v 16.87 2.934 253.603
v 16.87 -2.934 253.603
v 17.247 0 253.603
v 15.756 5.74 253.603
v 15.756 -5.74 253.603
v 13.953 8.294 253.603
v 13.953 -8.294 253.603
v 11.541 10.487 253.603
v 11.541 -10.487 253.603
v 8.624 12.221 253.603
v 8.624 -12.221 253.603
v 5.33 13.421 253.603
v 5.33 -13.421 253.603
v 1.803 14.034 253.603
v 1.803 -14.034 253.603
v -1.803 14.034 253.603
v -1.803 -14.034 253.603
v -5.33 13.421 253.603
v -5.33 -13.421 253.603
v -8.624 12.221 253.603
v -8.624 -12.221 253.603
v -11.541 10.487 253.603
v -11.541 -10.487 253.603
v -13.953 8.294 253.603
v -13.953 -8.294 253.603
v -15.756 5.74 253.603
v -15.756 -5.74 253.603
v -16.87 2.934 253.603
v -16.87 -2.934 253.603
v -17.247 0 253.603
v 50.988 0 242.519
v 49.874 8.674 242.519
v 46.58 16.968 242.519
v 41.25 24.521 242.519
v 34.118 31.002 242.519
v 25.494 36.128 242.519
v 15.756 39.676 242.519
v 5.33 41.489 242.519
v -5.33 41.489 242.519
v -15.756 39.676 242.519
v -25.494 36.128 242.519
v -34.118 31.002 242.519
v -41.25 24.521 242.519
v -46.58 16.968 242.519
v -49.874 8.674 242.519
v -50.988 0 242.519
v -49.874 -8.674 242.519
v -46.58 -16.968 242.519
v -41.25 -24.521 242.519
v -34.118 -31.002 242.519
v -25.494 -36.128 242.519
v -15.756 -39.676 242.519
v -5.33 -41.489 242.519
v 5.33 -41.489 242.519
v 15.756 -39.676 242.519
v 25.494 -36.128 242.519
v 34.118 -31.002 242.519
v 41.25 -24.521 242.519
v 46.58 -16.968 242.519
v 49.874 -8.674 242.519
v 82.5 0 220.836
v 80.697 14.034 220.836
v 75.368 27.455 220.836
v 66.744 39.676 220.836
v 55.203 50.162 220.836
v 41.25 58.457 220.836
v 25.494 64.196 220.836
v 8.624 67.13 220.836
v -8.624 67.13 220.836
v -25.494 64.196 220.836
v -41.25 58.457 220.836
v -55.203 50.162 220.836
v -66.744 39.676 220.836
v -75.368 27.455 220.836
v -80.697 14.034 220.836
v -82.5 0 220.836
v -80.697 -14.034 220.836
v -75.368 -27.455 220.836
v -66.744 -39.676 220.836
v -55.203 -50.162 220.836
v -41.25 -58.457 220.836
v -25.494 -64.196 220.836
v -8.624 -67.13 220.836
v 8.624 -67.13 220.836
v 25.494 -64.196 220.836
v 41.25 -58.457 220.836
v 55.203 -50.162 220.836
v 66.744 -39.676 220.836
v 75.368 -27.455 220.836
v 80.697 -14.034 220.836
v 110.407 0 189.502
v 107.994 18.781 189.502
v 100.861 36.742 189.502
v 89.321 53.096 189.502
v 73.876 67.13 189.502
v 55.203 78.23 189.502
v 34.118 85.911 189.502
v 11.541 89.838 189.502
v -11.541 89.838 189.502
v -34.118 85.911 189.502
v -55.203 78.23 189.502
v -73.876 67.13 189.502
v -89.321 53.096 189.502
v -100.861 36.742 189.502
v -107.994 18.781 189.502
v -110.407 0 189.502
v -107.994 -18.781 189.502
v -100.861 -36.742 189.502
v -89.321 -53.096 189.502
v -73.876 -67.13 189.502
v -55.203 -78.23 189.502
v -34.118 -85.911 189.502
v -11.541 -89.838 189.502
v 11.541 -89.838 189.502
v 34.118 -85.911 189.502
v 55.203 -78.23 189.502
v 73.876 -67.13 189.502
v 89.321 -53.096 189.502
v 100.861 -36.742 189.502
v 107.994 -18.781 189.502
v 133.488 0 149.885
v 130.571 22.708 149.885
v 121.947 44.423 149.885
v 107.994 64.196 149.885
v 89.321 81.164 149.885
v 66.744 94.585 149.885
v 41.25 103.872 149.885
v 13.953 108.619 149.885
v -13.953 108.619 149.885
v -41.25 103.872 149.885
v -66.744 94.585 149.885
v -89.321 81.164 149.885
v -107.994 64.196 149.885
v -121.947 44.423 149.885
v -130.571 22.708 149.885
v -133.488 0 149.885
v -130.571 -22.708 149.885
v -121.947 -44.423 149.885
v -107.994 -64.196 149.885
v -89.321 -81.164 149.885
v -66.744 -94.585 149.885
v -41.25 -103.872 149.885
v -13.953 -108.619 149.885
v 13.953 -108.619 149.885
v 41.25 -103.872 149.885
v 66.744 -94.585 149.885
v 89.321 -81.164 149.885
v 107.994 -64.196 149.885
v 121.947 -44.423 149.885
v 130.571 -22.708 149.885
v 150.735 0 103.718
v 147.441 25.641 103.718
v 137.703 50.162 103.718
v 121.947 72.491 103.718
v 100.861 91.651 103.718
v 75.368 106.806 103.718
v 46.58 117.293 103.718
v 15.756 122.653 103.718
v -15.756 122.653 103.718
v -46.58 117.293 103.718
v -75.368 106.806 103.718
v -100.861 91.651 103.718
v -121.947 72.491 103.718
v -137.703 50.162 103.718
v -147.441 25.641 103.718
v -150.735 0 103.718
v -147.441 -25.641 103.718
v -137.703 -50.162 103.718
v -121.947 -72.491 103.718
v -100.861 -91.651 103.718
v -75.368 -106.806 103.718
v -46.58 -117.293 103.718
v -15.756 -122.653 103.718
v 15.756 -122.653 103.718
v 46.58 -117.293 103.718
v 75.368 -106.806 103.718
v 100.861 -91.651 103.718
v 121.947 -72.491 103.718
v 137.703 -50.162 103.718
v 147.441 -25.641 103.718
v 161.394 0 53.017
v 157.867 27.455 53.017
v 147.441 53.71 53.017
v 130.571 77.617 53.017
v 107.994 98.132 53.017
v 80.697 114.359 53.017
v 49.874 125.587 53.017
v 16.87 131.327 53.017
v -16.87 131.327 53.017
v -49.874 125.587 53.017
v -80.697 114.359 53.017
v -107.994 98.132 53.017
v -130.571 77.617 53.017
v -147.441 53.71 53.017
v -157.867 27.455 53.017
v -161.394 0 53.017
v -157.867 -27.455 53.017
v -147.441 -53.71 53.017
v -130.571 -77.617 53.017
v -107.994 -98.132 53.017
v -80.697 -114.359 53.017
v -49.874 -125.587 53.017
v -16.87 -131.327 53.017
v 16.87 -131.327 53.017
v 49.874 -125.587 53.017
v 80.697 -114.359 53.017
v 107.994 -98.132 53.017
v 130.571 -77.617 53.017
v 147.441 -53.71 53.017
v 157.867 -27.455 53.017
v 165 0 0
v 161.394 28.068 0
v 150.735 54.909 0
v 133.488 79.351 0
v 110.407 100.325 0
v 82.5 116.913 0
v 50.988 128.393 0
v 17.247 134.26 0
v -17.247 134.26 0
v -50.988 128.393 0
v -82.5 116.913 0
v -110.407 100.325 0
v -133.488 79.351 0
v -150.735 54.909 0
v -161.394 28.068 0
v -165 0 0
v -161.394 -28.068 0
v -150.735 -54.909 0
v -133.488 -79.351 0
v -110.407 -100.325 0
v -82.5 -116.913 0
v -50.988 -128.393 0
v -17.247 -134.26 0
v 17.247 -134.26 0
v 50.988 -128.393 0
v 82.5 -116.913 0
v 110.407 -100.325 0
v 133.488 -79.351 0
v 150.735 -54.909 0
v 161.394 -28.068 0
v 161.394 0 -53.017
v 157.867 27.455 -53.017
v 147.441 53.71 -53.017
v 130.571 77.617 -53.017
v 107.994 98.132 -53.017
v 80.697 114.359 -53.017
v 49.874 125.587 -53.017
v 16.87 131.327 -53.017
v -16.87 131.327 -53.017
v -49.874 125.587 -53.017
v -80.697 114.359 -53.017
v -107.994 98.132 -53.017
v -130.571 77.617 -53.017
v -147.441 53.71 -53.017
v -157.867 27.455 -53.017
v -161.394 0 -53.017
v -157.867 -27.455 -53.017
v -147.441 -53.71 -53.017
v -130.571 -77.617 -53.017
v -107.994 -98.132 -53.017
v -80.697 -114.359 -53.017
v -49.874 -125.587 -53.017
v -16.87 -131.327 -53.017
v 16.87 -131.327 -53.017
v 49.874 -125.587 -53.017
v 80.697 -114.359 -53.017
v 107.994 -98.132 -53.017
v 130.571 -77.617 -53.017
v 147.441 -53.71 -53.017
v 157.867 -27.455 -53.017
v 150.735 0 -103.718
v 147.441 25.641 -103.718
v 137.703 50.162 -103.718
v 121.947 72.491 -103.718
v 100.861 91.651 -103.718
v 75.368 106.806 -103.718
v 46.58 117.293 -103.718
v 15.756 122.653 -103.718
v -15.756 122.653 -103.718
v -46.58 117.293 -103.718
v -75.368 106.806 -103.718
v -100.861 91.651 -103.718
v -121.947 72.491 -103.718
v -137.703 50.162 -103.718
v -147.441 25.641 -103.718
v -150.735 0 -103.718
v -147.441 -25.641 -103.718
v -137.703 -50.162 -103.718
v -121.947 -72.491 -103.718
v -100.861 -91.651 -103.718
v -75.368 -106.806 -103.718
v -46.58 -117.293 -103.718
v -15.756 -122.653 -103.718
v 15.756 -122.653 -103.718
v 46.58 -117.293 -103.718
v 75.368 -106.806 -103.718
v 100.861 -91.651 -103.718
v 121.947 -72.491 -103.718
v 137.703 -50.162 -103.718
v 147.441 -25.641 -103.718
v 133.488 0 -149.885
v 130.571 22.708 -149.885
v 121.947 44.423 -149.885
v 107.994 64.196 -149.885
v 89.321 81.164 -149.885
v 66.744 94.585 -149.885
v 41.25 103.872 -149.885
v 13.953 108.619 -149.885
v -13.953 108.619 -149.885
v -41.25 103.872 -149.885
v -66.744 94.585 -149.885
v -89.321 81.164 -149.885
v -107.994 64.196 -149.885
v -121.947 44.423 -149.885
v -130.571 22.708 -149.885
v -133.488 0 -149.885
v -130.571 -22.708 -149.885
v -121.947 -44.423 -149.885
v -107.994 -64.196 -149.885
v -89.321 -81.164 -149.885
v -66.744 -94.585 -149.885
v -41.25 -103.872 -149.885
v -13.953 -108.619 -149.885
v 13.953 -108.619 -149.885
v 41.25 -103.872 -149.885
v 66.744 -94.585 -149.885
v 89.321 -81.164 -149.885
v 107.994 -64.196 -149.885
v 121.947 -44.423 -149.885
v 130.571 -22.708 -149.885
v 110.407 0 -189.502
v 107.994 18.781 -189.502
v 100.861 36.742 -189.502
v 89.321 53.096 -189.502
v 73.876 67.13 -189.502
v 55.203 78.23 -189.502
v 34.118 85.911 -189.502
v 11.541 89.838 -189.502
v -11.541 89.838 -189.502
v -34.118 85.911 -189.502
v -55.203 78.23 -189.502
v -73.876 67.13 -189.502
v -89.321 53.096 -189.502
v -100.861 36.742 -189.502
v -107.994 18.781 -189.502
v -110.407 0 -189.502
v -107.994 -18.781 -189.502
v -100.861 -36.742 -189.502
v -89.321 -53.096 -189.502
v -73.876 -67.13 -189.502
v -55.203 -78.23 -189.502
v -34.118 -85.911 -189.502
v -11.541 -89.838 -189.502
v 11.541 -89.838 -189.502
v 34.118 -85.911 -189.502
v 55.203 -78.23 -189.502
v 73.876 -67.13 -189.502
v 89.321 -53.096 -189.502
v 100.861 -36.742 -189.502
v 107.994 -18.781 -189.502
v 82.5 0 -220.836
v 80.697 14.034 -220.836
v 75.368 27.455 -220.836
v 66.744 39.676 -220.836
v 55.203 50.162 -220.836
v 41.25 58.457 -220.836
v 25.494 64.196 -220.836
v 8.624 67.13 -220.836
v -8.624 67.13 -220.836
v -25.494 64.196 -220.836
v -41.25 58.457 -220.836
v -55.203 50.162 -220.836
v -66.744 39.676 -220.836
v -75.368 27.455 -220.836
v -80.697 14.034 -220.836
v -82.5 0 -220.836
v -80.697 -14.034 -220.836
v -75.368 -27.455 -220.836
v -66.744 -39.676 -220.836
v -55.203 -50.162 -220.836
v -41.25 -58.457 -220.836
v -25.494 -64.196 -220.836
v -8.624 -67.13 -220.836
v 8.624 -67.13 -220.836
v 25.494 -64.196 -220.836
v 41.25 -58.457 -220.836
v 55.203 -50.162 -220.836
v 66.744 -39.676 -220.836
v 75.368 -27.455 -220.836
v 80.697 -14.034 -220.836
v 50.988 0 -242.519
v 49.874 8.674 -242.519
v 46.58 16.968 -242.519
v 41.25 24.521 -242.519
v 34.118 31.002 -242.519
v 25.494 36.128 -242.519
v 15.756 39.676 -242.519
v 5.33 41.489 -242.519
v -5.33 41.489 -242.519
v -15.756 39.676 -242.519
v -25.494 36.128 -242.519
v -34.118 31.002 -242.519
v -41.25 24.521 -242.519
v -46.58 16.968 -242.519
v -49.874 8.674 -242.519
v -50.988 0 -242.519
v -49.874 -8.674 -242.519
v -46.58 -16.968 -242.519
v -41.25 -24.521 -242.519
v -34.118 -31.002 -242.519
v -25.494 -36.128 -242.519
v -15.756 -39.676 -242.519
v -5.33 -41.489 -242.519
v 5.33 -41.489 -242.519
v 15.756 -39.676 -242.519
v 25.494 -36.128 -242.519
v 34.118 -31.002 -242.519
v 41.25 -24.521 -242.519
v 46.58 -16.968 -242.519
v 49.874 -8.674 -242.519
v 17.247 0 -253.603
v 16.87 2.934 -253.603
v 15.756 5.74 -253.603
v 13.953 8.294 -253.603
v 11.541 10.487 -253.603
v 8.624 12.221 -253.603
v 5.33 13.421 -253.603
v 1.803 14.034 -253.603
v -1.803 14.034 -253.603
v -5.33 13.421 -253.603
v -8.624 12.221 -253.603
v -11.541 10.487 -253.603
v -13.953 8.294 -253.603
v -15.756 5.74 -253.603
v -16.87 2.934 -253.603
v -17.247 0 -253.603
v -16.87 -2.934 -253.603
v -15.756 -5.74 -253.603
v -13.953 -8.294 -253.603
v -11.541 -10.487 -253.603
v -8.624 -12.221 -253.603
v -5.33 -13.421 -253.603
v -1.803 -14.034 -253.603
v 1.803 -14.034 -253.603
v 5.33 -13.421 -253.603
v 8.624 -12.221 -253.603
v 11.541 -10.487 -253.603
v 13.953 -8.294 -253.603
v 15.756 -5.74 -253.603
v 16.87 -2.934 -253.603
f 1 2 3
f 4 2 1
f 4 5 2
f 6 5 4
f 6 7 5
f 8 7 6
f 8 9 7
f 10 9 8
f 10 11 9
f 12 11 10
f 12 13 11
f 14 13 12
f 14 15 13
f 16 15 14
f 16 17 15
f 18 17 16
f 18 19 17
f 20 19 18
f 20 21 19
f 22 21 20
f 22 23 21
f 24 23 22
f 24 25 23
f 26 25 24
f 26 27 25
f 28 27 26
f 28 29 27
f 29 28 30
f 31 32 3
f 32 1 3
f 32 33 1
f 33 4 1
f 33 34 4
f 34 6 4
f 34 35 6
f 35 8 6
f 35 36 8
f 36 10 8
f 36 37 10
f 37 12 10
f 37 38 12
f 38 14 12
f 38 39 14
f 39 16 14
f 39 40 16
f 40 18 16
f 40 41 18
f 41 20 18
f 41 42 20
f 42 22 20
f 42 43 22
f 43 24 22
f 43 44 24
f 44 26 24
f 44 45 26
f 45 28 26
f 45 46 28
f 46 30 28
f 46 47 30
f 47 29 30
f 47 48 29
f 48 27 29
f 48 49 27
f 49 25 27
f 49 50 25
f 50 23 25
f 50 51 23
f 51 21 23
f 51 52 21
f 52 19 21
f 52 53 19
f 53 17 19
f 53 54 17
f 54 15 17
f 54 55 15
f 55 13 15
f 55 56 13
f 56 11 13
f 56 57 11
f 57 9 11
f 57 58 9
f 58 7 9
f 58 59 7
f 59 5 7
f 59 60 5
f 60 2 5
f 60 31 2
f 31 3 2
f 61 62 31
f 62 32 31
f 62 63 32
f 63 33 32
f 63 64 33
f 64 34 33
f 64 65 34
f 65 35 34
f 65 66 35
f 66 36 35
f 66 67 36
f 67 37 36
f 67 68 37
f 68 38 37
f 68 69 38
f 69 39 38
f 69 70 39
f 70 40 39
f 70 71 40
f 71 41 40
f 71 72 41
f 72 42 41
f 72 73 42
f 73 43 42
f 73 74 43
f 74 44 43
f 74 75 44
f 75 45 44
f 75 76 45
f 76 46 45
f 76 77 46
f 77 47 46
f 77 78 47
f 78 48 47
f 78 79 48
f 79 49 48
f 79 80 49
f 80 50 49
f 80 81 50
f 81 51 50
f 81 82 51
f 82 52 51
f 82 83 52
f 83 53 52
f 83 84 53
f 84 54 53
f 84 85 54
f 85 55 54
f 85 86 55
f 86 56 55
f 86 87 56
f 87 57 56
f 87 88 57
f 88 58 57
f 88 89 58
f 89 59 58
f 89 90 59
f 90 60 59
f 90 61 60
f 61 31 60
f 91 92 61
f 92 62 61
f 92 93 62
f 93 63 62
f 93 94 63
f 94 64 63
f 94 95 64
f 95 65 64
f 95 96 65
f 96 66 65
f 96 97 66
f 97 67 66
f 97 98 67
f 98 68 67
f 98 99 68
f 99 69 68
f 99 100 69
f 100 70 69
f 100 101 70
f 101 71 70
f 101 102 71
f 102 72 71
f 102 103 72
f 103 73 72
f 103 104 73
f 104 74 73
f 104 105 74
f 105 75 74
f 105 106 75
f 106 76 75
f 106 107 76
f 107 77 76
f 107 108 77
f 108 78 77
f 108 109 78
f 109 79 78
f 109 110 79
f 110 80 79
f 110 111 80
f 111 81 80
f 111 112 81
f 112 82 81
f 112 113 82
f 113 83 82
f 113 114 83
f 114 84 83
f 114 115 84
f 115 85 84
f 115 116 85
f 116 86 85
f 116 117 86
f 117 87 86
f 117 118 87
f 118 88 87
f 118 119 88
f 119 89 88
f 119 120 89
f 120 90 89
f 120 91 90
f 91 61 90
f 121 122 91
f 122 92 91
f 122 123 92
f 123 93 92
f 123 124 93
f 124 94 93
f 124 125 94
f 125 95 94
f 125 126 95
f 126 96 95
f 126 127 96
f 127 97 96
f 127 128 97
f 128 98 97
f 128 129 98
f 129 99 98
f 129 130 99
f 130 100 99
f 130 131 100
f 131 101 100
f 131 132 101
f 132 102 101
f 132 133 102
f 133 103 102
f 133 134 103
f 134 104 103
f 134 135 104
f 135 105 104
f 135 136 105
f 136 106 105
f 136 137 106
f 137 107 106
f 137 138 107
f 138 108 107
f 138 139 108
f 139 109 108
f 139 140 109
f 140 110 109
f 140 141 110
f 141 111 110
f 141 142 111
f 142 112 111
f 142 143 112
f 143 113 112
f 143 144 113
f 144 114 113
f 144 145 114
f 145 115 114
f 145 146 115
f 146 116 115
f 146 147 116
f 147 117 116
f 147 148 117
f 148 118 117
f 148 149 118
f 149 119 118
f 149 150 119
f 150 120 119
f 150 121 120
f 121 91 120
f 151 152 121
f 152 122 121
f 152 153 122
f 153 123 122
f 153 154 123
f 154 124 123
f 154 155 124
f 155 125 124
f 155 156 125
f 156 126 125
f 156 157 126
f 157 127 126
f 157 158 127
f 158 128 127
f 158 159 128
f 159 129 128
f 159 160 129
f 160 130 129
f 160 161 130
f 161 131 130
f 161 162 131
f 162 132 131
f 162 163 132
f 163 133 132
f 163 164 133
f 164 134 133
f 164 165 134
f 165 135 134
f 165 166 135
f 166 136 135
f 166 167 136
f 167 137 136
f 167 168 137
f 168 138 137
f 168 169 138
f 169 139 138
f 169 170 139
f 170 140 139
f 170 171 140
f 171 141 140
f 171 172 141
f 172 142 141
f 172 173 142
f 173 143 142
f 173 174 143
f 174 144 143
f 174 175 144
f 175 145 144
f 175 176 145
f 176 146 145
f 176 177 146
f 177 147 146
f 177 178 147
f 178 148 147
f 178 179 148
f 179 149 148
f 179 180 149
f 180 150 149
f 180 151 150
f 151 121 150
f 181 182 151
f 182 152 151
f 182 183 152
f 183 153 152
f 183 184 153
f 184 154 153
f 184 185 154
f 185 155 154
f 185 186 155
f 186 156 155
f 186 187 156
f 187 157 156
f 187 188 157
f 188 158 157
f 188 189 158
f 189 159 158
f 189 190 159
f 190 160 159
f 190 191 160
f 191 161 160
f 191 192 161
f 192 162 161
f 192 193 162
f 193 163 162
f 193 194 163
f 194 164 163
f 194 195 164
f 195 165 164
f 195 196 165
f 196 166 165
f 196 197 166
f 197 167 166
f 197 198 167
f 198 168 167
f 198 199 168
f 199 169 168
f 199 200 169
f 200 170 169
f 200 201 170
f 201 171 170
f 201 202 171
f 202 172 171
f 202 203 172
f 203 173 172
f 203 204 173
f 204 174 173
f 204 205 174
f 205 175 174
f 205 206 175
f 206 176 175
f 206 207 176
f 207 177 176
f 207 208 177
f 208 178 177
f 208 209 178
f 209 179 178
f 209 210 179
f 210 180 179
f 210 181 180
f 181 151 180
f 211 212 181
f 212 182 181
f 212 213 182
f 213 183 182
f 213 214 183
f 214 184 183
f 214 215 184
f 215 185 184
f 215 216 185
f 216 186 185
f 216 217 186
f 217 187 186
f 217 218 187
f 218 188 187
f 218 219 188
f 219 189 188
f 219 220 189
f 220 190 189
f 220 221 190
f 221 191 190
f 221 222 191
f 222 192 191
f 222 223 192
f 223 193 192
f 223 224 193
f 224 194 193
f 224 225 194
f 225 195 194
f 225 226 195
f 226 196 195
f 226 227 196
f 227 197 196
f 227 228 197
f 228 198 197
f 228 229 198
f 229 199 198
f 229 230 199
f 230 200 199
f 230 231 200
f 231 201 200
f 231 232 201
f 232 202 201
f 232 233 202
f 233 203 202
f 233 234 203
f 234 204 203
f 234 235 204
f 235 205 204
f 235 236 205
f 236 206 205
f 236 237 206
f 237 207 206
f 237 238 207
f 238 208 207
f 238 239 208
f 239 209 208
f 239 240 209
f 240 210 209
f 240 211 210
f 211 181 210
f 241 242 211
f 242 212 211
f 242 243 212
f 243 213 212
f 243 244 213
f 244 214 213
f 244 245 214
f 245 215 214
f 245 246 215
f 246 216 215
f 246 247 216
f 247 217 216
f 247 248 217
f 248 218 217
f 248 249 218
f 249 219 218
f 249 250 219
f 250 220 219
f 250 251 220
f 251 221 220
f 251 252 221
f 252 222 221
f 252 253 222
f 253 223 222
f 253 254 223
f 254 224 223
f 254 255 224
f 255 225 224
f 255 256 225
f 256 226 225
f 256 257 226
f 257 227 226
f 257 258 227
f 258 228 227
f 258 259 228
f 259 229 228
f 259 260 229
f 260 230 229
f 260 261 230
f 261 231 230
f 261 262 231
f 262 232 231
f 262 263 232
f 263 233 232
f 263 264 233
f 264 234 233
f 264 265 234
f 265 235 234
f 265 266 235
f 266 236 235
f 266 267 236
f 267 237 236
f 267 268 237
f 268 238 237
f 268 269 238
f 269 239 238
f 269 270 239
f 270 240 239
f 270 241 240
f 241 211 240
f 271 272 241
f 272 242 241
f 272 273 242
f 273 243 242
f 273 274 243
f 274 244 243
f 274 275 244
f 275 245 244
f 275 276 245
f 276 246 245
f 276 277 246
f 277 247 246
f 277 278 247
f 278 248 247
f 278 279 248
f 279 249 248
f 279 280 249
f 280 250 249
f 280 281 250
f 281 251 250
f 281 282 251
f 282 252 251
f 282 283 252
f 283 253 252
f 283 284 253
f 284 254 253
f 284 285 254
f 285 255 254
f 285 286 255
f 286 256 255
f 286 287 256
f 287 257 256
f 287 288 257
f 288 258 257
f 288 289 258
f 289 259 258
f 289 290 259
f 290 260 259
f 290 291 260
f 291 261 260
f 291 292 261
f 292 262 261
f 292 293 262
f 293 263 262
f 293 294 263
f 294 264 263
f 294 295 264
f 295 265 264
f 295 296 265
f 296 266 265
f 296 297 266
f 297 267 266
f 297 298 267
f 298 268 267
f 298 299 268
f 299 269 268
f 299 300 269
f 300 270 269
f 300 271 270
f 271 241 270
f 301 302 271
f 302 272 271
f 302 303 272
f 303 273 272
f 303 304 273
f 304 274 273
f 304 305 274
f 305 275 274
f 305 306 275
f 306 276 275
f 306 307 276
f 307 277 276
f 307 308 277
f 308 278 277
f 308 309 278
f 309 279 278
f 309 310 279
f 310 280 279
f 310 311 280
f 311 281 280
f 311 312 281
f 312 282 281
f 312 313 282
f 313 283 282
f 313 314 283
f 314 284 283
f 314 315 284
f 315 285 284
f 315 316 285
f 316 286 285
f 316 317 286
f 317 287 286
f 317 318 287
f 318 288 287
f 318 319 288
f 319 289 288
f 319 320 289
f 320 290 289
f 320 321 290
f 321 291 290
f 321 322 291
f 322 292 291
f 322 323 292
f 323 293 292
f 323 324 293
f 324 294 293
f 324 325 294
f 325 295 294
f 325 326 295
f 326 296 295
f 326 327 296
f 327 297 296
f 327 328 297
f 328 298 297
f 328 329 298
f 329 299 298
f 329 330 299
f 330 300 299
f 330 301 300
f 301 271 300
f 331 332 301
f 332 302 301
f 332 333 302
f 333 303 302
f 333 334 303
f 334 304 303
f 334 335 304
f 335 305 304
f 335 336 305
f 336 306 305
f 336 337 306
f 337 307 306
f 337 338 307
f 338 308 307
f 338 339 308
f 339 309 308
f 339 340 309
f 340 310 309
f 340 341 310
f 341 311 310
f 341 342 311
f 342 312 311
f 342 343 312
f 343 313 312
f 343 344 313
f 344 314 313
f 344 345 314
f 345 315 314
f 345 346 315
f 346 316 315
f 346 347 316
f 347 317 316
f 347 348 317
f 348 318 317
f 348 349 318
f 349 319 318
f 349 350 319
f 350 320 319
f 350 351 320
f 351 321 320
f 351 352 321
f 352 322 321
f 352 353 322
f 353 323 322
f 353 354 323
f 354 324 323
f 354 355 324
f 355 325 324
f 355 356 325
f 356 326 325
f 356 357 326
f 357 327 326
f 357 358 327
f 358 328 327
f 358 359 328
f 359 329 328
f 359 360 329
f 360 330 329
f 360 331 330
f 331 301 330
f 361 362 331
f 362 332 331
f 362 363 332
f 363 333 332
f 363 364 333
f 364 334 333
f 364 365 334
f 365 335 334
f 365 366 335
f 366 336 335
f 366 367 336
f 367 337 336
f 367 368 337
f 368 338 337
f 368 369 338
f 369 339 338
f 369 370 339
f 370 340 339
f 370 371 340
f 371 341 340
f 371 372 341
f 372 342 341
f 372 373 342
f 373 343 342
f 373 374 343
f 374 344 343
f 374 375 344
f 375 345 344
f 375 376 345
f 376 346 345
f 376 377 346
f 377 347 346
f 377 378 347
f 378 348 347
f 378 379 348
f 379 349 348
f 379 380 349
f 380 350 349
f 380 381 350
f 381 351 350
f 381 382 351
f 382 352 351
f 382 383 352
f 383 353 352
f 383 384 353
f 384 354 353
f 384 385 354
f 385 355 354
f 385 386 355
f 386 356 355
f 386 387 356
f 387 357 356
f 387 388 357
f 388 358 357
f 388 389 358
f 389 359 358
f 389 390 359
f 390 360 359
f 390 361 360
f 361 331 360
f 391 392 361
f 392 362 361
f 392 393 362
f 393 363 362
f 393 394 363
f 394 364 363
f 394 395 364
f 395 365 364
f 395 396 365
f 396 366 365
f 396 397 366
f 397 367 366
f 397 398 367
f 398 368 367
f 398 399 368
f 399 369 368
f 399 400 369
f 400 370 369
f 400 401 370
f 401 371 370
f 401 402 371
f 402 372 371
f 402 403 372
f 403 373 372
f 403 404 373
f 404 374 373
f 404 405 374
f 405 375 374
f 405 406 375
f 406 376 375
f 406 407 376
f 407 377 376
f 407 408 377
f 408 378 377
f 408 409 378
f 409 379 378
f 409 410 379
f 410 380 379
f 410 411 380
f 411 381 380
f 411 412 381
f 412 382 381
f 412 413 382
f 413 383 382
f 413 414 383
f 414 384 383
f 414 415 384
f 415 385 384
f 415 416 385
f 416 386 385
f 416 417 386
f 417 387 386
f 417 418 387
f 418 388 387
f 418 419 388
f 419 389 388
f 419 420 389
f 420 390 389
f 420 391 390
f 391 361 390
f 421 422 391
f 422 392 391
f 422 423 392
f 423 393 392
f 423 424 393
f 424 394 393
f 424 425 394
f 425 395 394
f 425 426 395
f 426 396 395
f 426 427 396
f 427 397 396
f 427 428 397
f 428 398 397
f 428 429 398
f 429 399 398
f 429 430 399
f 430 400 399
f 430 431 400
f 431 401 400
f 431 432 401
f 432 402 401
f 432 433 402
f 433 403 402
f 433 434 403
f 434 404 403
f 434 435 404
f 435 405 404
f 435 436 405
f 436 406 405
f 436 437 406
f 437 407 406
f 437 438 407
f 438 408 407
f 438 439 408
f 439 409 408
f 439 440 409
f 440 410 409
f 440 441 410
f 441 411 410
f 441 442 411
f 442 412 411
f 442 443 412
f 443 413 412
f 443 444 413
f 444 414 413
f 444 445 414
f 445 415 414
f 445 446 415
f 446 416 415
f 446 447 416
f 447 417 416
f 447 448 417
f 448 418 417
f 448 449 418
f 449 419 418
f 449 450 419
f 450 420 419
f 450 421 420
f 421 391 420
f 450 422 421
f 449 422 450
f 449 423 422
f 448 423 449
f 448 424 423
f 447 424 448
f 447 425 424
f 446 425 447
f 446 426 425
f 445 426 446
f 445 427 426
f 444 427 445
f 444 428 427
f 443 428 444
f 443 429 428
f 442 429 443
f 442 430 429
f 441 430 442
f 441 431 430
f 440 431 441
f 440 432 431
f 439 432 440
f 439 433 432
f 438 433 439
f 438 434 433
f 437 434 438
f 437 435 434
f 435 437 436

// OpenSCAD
// Generated by SolidPython 1.0.1 on 2020-07-29 00:46:49


scale(v = [11, 9, 17]) {
	sphere(r = 15);
}
/***********************************************
*********      SolidPython code:      **********
************************************************
 
# import packages: SolidPython
from solid import *
from solid.utils import *
from itertools import chain, combinations, permutations


class Resize:

    def __init__(self, scad_file):
        self.scad_file = scad_file
        #self.scad_file = import_scad(scad_file)
        # cone/cylinder param:
        self.r1 = 0
        self.r2 = 0
        self.h = 0
        # rectangular prism param:
        self.w = 0
        self.l = 0
        # ellipse param:
        self.r = 0

    # import OpenScad code (file name corresponds to shape)


    # classify shape + parameters
    def assign(self, param1, param2, param3):
        if self.scad_file == 'cone.scad':
            self.r1 = param1
            self.r2 = param2
            self.h = param3
        elif self.scad_file == 'cylinder.scad':
            self.r1 = param1
            self.r2 = param2
            self.h = param3
        elif self.scad_file == 'rectangularPrism.scad':
            self.h = param1
            self.l = param2
            self.w = param3
        else:
            self.r = param1
            self.h = param2

    # resize parameters
    def iterate(self):
        x = range(3, 20, 2)
        i = 1
        if self.scad_file == 'cone.scad':
            tempList = list(permutations(x, 2))
            for temp in tempList:
                param1 = temp[0]
                param2 = temp[1]
                filepath = 'produced_scad_files/' + 'cone' + str(param1) + '_' + str(param2) + '_' + '.scad'
                scad_render_to_file(cylinder(h=param1, r1=param2, r2=0), filepath)

        elif self.scad_file == 'cylinder.scad':
            tempList = list(permutations(x, 3))
            for temp in tempList:
                param1 = temp[0]
                param2 = temp[1]
                filepath = 'produced_scad_files/' + 'cylinder' + str(param1) + '_' + str(param2) + '_' + '.scad'
                scad_render_to_file(cylinder(h=param1, r1=param2, r2=param2), filepath)

        elif self.scad_file == 'rectangularPrism.scad':
            tempList = list(permutations(x, 3))
            for temp in tempList:
                param1 = temp[0]
                param2 = temp[1]
                param3 = temp[2]
                filepath = 'produced_scad_files/' + 'rectangularPrism' + str(param1) + '_' + str(param2) + '_' + str(
                    param3) + '.scad'
                scad_render_to_file(cube(size=(param1, param2, param3)), filepath)

        elif self.scad_file == 'ellipse.scad':
            tempList = list(permutations(x, 4))
            for temp in tempList:
                param1 = temp[0]
                param2 = temp[1]
                param3 = temp[2]
                param4 = temp[3]
                filepath = 'produced_scad_files/' + 'ellipse' + str(param1) + '_' + str(param2) + '_' + str(param3) + '_' + str(param4) + '.scad'
                scad_render_to_file(scale([param1, param2, param3])(sphere(r=param4)), filepath)

    def render_to_scadfile(self):
        scad_render_to_file(scad, 'example.scad') 
 
************************************************/
